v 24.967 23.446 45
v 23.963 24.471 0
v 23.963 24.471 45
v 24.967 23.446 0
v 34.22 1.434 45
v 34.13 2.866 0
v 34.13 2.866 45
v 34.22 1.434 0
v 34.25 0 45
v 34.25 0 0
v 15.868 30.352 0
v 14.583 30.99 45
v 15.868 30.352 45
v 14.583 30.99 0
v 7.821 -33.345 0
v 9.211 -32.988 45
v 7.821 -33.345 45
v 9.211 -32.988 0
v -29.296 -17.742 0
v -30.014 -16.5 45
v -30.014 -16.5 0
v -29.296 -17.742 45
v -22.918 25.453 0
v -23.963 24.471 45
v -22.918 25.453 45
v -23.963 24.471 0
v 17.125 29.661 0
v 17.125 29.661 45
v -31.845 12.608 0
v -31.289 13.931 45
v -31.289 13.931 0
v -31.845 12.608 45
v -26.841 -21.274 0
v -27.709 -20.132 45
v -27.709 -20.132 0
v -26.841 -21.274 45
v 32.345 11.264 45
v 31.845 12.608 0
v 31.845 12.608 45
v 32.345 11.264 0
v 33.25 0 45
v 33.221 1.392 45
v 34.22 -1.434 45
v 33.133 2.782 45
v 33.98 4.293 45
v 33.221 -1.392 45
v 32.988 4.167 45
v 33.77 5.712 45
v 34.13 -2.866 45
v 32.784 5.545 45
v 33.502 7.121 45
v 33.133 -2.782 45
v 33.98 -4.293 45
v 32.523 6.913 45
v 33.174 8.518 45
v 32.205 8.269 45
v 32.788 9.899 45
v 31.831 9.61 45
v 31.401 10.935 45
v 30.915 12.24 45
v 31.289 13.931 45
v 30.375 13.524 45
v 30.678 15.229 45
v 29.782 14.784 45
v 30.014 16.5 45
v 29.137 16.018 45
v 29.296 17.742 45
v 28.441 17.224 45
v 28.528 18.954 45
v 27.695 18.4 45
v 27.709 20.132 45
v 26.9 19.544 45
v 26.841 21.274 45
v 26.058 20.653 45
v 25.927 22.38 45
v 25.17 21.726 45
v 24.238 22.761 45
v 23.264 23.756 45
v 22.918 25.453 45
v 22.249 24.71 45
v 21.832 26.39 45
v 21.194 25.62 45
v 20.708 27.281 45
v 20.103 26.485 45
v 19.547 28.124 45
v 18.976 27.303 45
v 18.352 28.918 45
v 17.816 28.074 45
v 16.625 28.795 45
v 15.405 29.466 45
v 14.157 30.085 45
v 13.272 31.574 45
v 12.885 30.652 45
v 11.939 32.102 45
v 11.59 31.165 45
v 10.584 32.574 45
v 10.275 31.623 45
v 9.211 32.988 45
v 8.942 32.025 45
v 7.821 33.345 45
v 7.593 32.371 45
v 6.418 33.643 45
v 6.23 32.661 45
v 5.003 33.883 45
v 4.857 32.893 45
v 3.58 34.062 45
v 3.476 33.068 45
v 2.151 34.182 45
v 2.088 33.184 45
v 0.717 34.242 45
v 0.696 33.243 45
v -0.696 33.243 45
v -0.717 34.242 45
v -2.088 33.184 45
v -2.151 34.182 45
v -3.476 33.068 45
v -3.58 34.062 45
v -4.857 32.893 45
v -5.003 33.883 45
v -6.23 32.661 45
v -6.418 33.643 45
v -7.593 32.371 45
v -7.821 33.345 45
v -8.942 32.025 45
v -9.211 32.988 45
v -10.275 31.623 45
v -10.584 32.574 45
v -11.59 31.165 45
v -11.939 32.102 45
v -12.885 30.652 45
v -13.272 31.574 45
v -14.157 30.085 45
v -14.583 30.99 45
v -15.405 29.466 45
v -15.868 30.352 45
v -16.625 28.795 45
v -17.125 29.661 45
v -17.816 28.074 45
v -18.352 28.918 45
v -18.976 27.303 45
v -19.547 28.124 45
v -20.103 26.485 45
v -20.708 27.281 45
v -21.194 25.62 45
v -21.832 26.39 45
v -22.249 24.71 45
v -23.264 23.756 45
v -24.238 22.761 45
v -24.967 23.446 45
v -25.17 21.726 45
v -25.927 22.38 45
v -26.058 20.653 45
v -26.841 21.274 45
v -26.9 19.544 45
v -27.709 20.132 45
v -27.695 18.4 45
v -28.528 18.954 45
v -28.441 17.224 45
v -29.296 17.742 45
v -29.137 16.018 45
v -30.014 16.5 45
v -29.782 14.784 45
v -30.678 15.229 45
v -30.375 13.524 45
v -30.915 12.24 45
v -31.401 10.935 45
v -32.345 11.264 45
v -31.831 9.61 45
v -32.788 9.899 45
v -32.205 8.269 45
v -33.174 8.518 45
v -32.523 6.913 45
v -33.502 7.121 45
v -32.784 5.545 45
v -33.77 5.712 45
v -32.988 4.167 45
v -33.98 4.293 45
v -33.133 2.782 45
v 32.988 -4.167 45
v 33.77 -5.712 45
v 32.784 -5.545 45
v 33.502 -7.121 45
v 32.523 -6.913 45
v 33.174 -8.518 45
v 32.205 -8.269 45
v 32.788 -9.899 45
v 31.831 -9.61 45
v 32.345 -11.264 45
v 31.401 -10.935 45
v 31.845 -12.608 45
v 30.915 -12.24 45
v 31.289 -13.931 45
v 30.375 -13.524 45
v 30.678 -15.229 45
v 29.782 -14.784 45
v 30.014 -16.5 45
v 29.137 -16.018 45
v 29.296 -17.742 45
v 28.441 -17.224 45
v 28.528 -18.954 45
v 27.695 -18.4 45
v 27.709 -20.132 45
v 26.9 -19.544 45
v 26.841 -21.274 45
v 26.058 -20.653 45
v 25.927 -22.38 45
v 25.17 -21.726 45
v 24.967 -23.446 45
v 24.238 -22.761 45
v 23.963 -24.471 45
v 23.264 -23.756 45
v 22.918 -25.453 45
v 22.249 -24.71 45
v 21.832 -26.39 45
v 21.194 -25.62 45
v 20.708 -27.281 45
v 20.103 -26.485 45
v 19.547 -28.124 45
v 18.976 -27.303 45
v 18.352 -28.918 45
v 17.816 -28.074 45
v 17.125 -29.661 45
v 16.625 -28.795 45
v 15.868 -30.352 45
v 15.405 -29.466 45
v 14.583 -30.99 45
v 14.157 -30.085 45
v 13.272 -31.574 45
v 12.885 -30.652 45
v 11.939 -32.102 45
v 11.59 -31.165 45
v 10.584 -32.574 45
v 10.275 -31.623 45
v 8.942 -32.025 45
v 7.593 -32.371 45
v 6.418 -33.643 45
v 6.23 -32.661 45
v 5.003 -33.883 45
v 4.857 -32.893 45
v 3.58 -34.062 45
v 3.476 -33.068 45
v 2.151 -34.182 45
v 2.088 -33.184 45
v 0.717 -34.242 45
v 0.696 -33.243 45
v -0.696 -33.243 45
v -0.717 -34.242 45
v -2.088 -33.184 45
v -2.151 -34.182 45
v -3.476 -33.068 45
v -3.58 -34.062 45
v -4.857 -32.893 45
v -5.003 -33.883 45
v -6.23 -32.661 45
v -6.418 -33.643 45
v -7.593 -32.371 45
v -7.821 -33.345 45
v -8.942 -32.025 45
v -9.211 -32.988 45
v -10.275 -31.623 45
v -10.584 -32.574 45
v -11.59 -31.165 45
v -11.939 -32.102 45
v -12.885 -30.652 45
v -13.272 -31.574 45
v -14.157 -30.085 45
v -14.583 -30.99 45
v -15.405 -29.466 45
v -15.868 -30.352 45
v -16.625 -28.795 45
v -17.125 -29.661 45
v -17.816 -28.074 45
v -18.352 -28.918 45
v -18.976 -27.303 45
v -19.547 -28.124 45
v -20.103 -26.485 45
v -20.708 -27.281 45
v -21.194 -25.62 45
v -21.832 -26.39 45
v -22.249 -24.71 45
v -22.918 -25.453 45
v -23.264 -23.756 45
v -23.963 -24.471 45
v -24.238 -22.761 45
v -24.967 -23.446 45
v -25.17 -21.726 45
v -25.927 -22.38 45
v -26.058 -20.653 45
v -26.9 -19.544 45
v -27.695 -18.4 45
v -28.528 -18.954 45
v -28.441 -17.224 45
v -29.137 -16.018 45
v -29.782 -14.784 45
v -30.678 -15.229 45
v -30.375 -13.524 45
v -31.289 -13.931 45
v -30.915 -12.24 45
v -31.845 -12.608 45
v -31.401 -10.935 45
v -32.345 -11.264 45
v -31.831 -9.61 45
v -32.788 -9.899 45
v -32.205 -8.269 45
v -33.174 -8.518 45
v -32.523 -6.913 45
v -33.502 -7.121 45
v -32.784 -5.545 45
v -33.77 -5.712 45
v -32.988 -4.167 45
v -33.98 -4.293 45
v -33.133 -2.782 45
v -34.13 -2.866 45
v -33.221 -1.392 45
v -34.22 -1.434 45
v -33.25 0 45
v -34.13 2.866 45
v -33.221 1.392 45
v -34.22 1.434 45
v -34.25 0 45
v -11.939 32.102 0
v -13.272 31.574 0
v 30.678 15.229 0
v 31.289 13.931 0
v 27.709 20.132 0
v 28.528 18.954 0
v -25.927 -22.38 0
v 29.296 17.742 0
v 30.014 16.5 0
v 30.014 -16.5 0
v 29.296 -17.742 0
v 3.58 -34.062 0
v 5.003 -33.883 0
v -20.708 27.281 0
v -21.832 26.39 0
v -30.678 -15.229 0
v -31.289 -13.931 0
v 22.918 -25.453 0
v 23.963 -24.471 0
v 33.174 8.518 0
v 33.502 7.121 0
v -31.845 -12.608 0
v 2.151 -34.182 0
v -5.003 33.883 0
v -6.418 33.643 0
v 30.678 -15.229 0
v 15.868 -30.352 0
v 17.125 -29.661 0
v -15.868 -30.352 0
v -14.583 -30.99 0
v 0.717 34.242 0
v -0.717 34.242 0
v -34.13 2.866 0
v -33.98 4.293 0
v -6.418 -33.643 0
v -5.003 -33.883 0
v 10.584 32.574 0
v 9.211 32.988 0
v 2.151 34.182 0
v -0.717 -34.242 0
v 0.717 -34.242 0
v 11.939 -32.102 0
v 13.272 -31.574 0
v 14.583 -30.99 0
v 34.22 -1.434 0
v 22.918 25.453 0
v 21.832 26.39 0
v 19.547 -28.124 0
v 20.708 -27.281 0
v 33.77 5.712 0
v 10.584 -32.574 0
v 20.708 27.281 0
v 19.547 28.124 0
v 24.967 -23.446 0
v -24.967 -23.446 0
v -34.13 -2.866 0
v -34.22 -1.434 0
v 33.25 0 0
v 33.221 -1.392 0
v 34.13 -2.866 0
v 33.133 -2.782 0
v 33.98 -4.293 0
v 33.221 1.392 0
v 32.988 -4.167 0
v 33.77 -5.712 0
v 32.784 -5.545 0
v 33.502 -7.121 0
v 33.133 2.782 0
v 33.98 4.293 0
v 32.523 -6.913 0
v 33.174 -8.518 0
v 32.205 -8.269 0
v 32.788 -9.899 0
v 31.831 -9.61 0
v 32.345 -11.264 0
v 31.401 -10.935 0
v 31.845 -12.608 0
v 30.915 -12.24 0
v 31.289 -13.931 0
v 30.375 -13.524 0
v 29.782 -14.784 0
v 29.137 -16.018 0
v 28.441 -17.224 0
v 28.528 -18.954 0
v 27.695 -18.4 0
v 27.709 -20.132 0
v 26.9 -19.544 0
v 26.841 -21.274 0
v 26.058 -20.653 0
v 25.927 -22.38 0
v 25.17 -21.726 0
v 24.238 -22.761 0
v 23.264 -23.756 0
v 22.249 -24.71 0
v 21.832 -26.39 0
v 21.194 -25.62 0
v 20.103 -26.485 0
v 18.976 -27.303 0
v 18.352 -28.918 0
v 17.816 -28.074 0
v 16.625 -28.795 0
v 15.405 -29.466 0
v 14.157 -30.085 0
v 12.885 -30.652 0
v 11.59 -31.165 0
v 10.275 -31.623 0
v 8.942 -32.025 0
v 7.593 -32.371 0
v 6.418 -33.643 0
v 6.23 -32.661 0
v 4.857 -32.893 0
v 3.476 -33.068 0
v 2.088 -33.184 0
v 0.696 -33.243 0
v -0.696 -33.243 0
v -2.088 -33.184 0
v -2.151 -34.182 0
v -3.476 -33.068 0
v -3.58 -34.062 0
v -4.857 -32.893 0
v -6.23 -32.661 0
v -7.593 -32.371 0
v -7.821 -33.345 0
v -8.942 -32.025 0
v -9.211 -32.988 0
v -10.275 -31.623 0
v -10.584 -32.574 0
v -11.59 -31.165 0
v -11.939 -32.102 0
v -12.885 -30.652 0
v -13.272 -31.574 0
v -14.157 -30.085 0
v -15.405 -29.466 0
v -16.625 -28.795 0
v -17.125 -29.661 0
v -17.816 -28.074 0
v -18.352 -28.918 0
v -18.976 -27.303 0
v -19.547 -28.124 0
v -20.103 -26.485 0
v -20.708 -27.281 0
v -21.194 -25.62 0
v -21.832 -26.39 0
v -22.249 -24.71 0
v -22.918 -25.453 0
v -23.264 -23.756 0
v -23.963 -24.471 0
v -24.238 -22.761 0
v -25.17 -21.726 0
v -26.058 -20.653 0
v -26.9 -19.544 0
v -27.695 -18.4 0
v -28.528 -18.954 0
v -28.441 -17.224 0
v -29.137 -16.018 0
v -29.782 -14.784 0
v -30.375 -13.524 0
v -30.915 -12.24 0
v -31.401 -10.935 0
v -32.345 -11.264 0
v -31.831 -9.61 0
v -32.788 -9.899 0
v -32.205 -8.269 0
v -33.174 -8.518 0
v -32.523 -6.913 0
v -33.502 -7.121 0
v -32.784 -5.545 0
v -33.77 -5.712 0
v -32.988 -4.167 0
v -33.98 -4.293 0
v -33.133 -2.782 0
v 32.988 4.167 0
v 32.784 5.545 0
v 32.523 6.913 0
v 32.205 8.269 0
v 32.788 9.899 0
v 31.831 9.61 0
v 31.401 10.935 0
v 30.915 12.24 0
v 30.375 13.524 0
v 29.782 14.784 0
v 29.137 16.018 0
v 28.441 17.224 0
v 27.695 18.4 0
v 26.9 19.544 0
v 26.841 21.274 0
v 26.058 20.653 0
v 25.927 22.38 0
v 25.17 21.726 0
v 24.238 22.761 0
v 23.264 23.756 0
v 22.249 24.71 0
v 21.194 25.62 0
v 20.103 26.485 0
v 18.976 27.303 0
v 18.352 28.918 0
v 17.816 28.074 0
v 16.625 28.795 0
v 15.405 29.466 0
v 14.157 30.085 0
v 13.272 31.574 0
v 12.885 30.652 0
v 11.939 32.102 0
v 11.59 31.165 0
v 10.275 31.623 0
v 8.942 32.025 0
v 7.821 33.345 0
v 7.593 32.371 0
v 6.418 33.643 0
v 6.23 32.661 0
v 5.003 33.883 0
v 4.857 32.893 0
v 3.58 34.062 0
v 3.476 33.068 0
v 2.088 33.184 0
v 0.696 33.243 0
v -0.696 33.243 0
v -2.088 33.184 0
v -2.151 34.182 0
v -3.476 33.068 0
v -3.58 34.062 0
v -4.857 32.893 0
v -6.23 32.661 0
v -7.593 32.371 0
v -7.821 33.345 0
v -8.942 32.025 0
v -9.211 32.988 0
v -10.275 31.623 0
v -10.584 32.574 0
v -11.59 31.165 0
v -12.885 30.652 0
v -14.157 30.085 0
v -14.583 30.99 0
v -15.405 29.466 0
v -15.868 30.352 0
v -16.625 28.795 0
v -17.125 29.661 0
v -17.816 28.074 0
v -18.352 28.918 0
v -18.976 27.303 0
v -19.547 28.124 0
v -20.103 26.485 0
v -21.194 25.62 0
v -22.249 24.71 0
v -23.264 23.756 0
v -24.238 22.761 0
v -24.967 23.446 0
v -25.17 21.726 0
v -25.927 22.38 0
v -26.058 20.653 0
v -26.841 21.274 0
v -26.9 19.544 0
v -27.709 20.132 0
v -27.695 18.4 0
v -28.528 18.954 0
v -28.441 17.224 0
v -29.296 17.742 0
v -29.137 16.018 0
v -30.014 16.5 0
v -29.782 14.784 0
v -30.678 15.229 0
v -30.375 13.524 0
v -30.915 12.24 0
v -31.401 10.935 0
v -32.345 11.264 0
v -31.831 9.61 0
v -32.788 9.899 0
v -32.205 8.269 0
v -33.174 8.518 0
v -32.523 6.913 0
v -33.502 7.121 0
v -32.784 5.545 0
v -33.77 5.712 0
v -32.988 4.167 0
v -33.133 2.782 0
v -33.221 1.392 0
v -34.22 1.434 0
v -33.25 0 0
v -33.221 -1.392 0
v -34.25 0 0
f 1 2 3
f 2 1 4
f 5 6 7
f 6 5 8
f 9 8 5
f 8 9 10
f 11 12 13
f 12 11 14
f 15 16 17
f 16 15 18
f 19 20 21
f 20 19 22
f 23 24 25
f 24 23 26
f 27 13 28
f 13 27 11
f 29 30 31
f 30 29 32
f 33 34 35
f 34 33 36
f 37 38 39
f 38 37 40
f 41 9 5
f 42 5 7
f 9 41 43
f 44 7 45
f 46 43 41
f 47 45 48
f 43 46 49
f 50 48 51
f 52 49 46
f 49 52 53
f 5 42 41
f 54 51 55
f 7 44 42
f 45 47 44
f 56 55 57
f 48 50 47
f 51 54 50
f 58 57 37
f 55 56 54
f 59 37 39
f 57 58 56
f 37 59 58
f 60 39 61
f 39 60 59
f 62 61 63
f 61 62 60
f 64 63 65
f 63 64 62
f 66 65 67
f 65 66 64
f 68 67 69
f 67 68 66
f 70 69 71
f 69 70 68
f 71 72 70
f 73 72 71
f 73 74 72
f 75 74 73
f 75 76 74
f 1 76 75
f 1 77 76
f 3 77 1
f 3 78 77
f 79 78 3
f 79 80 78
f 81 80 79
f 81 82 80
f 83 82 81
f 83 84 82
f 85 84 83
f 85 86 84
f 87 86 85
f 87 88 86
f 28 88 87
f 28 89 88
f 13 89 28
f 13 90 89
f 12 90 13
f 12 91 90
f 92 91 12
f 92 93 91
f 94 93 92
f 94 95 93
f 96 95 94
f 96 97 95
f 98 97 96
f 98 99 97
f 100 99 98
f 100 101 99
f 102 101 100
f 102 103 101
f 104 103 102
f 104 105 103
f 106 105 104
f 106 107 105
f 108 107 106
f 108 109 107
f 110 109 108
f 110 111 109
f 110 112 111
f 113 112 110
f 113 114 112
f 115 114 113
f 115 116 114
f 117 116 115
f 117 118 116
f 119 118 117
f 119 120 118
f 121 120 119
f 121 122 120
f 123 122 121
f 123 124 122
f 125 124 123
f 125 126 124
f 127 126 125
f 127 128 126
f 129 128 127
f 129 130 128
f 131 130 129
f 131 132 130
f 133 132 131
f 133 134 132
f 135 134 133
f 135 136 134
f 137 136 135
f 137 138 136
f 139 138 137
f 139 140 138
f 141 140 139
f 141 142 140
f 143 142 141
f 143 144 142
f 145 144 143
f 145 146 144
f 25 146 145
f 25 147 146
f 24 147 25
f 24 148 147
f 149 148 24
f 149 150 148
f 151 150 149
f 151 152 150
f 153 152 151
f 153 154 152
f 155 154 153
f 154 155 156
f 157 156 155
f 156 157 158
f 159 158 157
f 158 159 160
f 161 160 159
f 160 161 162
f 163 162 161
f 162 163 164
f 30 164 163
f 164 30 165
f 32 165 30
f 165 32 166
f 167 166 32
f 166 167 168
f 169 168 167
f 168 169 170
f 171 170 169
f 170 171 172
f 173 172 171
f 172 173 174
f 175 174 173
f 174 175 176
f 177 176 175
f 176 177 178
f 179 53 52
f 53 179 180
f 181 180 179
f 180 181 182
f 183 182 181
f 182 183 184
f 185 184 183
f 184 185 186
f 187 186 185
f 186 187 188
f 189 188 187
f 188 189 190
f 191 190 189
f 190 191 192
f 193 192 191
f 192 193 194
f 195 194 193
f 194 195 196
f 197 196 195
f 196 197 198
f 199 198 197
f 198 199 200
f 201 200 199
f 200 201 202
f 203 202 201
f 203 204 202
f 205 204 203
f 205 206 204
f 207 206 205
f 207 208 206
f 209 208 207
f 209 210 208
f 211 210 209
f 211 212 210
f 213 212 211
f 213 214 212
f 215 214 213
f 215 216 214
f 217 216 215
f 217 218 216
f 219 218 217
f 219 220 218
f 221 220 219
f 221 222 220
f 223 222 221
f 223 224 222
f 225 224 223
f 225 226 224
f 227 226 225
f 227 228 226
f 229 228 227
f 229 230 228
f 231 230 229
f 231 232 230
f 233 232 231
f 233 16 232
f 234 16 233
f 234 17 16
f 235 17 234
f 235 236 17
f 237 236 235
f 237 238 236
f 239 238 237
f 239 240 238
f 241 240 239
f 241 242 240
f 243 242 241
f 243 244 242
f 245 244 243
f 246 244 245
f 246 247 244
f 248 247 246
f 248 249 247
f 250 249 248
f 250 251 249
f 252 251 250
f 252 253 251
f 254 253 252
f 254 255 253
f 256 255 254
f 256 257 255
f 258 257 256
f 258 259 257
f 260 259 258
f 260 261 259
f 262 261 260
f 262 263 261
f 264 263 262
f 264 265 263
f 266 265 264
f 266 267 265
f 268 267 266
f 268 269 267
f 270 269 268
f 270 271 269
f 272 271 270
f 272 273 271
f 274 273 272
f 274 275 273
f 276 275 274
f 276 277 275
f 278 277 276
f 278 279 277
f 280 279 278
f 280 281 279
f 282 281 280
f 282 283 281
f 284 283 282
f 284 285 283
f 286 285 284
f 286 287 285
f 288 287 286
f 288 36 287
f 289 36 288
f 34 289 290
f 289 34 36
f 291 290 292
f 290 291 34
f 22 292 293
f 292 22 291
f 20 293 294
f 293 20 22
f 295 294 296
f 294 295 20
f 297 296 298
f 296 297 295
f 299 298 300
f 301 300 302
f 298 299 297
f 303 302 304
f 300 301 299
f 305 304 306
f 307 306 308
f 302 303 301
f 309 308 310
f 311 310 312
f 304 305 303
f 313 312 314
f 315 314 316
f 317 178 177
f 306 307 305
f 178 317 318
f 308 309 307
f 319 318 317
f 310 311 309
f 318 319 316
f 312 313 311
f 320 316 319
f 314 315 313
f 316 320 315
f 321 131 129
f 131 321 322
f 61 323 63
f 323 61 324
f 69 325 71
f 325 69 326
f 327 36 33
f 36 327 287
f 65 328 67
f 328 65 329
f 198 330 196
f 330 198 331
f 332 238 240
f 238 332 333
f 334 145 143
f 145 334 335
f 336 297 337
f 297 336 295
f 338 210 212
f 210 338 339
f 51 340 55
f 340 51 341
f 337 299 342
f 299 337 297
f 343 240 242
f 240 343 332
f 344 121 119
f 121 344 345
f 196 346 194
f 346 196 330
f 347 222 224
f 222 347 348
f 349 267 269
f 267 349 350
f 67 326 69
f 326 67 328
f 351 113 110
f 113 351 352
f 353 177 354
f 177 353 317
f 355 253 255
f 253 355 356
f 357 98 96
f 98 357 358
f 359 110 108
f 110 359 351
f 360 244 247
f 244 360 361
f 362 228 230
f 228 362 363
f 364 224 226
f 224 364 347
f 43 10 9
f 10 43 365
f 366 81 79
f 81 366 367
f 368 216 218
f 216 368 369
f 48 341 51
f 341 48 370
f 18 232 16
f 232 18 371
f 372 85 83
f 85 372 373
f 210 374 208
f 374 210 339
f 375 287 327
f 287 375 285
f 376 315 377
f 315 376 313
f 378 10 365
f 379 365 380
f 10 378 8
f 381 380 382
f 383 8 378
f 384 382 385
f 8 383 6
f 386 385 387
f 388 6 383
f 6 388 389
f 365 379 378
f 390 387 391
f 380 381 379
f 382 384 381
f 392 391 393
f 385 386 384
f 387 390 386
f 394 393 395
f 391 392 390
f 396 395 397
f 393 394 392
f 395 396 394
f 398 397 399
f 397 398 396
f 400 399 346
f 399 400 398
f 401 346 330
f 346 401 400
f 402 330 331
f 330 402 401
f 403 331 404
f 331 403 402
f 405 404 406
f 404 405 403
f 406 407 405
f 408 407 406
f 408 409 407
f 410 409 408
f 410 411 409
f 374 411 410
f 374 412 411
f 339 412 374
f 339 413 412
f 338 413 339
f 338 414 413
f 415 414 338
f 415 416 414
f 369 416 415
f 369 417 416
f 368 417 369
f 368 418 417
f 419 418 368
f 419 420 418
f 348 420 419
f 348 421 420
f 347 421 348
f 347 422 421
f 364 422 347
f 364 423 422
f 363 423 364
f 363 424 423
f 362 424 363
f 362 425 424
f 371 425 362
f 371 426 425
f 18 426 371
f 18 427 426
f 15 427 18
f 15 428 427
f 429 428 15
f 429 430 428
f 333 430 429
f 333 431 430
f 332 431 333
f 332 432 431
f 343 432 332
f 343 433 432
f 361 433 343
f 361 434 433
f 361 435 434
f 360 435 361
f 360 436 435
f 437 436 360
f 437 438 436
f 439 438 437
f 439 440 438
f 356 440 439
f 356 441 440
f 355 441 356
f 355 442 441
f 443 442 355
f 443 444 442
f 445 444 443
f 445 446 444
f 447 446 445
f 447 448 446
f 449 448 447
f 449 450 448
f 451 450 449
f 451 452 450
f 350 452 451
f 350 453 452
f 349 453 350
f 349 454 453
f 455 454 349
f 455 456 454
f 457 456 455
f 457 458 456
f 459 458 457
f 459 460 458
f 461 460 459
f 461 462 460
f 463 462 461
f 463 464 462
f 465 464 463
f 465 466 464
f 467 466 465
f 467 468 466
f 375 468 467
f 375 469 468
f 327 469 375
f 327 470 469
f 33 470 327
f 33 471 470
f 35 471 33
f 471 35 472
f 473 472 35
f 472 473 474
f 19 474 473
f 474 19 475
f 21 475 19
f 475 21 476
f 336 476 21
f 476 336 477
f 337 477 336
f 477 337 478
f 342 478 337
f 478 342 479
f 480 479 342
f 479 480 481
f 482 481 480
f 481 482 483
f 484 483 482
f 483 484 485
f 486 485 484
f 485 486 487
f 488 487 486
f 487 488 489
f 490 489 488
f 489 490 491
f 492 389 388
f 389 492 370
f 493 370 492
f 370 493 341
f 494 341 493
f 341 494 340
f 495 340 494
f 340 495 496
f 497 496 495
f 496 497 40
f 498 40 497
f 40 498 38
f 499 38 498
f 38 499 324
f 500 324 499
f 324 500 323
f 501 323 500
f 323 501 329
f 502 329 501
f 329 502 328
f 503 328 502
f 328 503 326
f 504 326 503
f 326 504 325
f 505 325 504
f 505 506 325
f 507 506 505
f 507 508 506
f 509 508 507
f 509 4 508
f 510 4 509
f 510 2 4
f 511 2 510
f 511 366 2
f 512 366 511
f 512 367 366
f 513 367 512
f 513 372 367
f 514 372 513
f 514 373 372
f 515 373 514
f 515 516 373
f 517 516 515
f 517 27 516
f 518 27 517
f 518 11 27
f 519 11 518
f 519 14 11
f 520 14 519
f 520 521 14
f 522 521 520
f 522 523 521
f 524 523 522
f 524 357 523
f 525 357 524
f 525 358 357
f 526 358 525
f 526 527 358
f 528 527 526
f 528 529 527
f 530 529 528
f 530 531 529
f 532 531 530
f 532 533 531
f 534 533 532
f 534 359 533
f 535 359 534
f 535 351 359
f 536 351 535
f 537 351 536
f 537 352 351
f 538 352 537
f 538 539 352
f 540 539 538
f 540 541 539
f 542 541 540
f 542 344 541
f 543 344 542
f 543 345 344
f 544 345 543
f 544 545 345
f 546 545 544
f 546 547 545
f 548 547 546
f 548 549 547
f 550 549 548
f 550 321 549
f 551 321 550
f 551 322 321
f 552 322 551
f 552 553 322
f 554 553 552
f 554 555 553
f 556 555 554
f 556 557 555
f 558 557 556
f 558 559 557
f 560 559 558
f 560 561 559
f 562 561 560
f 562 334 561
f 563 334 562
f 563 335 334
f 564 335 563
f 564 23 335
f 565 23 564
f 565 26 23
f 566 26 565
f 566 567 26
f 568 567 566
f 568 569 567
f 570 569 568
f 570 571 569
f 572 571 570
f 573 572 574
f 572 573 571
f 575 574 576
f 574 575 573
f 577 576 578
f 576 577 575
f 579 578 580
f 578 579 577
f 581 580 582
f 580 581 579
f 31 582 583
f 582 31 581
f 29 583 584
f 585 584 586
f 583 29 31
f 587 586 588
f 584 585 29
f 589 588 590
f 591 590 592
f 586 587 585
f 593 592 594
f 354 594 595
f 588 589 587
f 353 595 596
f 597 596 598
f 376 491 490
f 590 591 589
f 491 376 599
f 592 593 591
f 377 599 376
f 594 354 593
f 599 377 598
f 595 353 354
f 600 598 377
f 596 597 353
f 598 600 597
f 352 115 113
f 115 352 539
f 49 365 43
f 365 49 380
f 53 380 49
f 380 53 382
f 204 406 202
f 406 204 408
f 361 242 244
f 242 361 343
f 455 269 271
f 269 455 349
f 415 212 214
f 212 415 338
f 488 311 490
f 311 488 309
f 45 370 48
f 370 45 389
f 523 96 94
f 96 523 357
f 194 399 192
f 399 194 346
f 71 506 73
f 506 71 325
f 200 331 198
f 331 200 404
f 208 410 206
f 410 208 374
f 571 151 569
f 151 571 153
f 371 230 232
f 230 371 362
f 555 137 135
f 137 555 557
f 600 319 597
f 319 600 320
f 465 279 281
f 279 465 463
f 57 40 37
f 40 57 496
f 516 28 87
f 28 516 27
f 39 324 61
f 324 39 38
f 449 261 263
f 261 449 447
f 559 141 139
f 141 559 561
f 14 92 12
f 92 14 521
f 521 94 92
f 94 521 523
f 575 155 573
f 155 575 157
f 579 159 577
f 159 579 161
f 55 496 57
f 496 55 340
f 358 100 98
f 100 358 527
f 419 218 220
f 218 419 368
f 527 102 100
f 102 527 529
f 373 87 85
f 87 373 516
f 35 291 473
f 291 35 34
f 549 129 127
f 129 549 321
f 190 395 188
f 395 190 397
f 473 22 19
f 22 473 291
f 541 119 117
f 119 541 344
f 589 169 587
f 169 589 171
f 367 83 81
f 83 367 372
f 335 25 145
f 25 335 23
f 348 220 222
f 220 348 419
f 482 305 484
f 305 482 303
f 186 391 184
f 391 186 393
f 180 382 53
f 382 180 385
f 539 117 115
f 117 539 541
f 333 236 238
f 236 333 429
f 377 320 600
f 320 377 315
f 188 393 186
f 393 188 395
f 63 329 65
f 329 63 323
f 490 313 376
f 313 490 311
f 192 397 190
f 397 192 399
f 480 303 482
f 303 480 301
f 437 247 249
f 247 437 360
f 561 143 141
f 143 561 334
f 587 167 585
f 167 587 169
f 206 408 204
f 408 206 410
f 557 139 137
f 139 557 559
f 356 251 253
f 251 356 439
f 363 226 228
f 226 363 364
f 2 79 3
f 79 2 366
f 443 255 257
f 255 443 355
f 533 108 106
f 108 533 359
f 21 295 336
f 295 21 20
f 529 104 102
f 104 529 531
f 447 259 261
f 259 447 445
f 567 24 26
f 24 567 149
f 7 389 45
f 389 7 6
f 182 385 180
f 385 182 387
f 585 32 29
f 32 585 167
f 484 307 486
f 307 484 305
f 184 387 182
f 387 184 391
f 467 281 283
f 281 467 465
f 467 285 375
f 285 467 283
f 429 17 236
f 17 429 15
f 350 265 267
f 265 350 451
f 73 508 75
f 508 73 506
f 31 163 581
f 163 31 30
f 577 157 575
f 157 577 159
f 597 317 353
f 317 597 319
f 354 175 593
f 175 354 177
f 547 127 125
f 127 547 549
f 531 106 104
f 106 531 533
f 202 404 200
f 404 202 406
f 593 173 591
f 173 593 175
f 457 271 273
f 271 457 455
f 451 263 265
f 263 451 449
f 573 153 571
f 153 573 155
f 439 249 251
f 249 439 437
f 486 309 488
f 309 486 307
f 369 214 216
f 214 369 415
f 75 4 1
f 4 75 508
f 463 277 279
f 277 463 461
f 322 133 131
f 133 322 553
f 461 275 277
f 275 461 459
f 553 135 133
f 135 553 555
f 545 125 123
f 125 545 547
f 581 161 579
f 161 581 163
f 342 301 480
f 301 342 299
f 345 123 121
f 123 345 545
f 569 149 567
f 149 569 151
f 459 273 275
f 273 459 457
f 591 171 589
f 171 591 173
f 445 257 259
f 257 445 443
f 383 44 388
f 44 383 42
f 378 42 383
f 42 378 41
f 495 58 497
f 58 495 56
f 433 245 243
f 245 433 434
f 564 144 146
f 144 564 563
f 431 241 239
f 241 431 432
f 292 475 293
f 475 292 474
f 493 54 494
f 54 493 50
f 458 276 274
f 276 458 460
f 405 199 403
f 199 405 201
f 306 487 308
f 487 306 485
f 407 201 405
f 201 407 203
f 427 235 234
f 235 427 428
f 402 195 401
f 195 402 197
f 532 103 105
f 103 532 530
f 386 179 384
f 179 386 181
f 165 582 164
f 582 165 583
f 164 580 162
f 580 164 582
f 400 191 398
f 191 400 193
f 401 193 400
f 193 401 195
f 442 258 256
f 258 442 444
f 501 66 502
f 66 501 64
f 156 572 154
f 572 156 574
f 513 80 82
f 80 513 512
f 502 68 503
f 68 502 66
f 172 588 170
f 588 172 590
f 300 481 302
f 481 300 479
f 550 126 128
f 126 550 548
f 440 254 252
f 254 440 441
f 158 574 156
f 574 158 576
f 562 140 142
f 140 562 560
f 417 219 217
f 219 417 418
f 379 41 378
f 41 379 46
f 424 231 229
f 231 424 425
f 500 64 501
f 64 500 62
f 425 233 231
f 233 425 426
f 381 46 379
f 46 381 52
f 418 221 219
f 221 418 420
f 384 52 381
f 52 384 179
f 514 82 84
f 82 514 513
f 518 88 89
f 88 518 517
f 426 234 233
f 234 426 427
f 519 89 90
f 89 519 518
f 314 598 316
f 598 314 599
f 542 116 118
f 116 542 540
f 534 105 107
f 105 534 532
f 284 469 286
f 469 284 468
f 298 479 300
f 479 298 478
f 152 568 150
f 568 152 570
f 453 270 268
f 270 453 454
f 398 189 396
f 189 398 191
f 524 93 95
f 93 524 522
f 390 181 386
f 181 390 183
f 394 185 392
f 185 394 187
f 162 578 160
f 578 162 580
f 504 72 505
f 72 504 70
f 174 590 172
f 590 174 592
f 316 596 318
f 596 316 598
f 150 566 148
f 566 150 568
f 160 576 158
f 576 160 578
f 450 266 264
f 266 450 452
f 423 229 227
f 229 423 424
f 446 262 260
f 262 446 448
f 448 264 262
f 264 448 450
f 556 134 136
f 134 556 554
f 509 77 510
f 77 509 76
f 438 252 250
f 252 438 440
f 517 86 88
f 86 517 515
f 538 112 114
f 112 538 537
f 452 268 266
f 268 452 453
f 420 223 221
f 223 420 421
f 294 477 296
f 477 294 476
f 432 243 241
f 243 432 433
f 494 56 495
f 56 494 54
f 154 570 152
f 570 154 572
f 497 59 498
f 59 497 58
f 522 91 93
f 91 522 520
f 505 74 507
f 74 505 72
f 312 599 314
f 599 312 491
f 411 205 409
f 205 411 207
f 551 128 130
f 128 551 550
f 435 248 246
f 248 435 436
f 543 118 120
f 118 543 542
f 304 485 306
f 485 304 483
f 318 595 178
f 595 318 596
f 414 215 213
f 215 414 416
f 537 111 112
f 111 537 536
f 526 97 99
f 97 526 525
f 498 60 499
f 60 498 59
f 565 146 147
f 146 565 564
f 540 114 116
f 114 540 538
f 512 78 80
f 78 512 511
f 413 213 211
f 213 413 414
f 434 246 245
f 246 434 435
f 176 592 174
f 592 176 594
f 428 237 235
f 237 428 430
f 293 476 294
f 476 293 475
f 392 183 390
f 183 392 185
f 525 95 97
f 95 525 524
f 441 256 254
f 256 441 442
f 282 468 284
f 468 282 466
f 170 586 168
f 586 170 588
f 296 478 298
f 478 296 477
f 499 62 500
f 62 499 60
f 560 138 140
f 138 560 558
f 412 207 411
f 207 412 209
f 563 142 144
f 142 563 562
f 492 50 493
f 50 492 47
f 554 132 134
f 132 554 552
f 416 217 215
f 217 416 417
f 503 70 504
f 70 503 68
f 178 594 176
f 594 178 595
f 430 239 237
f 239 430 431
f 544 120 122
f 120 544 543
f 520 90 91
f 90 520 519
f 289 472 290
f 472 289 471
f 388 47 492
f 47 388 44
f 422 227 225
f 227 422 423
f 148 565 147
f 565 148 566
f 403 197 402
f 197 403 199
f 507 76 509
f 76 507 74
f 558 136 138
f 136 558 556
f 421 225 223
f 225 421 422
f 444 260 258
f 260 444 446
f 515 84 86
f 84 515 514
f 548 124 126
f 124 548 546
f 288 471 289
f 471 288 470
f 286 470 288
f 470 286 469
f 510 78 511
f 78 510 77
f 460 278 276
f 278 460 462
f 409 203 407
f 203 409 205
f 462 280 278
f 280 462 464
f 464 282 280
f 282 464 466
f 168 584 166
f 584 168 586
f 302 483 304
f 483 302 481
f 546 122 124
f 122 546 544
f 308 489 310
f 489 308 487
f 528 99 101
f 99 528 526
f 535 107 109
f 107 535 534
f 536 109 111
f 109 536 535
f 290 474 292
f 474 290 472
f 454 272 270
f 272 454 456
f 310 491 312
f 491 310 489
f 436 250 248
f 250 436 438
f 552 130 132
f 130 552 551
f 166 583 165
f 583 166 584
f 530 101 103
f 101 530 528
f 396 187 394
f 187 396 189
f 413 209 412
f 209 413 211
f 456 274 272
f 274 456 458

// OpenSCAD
$fn = 150;

difference() {
	cylinder(d = 68.5, h = 45);
	translate(v = [0, 0, -1]) {
		cylinder(d = 66.5, h = 47);
	}
}
